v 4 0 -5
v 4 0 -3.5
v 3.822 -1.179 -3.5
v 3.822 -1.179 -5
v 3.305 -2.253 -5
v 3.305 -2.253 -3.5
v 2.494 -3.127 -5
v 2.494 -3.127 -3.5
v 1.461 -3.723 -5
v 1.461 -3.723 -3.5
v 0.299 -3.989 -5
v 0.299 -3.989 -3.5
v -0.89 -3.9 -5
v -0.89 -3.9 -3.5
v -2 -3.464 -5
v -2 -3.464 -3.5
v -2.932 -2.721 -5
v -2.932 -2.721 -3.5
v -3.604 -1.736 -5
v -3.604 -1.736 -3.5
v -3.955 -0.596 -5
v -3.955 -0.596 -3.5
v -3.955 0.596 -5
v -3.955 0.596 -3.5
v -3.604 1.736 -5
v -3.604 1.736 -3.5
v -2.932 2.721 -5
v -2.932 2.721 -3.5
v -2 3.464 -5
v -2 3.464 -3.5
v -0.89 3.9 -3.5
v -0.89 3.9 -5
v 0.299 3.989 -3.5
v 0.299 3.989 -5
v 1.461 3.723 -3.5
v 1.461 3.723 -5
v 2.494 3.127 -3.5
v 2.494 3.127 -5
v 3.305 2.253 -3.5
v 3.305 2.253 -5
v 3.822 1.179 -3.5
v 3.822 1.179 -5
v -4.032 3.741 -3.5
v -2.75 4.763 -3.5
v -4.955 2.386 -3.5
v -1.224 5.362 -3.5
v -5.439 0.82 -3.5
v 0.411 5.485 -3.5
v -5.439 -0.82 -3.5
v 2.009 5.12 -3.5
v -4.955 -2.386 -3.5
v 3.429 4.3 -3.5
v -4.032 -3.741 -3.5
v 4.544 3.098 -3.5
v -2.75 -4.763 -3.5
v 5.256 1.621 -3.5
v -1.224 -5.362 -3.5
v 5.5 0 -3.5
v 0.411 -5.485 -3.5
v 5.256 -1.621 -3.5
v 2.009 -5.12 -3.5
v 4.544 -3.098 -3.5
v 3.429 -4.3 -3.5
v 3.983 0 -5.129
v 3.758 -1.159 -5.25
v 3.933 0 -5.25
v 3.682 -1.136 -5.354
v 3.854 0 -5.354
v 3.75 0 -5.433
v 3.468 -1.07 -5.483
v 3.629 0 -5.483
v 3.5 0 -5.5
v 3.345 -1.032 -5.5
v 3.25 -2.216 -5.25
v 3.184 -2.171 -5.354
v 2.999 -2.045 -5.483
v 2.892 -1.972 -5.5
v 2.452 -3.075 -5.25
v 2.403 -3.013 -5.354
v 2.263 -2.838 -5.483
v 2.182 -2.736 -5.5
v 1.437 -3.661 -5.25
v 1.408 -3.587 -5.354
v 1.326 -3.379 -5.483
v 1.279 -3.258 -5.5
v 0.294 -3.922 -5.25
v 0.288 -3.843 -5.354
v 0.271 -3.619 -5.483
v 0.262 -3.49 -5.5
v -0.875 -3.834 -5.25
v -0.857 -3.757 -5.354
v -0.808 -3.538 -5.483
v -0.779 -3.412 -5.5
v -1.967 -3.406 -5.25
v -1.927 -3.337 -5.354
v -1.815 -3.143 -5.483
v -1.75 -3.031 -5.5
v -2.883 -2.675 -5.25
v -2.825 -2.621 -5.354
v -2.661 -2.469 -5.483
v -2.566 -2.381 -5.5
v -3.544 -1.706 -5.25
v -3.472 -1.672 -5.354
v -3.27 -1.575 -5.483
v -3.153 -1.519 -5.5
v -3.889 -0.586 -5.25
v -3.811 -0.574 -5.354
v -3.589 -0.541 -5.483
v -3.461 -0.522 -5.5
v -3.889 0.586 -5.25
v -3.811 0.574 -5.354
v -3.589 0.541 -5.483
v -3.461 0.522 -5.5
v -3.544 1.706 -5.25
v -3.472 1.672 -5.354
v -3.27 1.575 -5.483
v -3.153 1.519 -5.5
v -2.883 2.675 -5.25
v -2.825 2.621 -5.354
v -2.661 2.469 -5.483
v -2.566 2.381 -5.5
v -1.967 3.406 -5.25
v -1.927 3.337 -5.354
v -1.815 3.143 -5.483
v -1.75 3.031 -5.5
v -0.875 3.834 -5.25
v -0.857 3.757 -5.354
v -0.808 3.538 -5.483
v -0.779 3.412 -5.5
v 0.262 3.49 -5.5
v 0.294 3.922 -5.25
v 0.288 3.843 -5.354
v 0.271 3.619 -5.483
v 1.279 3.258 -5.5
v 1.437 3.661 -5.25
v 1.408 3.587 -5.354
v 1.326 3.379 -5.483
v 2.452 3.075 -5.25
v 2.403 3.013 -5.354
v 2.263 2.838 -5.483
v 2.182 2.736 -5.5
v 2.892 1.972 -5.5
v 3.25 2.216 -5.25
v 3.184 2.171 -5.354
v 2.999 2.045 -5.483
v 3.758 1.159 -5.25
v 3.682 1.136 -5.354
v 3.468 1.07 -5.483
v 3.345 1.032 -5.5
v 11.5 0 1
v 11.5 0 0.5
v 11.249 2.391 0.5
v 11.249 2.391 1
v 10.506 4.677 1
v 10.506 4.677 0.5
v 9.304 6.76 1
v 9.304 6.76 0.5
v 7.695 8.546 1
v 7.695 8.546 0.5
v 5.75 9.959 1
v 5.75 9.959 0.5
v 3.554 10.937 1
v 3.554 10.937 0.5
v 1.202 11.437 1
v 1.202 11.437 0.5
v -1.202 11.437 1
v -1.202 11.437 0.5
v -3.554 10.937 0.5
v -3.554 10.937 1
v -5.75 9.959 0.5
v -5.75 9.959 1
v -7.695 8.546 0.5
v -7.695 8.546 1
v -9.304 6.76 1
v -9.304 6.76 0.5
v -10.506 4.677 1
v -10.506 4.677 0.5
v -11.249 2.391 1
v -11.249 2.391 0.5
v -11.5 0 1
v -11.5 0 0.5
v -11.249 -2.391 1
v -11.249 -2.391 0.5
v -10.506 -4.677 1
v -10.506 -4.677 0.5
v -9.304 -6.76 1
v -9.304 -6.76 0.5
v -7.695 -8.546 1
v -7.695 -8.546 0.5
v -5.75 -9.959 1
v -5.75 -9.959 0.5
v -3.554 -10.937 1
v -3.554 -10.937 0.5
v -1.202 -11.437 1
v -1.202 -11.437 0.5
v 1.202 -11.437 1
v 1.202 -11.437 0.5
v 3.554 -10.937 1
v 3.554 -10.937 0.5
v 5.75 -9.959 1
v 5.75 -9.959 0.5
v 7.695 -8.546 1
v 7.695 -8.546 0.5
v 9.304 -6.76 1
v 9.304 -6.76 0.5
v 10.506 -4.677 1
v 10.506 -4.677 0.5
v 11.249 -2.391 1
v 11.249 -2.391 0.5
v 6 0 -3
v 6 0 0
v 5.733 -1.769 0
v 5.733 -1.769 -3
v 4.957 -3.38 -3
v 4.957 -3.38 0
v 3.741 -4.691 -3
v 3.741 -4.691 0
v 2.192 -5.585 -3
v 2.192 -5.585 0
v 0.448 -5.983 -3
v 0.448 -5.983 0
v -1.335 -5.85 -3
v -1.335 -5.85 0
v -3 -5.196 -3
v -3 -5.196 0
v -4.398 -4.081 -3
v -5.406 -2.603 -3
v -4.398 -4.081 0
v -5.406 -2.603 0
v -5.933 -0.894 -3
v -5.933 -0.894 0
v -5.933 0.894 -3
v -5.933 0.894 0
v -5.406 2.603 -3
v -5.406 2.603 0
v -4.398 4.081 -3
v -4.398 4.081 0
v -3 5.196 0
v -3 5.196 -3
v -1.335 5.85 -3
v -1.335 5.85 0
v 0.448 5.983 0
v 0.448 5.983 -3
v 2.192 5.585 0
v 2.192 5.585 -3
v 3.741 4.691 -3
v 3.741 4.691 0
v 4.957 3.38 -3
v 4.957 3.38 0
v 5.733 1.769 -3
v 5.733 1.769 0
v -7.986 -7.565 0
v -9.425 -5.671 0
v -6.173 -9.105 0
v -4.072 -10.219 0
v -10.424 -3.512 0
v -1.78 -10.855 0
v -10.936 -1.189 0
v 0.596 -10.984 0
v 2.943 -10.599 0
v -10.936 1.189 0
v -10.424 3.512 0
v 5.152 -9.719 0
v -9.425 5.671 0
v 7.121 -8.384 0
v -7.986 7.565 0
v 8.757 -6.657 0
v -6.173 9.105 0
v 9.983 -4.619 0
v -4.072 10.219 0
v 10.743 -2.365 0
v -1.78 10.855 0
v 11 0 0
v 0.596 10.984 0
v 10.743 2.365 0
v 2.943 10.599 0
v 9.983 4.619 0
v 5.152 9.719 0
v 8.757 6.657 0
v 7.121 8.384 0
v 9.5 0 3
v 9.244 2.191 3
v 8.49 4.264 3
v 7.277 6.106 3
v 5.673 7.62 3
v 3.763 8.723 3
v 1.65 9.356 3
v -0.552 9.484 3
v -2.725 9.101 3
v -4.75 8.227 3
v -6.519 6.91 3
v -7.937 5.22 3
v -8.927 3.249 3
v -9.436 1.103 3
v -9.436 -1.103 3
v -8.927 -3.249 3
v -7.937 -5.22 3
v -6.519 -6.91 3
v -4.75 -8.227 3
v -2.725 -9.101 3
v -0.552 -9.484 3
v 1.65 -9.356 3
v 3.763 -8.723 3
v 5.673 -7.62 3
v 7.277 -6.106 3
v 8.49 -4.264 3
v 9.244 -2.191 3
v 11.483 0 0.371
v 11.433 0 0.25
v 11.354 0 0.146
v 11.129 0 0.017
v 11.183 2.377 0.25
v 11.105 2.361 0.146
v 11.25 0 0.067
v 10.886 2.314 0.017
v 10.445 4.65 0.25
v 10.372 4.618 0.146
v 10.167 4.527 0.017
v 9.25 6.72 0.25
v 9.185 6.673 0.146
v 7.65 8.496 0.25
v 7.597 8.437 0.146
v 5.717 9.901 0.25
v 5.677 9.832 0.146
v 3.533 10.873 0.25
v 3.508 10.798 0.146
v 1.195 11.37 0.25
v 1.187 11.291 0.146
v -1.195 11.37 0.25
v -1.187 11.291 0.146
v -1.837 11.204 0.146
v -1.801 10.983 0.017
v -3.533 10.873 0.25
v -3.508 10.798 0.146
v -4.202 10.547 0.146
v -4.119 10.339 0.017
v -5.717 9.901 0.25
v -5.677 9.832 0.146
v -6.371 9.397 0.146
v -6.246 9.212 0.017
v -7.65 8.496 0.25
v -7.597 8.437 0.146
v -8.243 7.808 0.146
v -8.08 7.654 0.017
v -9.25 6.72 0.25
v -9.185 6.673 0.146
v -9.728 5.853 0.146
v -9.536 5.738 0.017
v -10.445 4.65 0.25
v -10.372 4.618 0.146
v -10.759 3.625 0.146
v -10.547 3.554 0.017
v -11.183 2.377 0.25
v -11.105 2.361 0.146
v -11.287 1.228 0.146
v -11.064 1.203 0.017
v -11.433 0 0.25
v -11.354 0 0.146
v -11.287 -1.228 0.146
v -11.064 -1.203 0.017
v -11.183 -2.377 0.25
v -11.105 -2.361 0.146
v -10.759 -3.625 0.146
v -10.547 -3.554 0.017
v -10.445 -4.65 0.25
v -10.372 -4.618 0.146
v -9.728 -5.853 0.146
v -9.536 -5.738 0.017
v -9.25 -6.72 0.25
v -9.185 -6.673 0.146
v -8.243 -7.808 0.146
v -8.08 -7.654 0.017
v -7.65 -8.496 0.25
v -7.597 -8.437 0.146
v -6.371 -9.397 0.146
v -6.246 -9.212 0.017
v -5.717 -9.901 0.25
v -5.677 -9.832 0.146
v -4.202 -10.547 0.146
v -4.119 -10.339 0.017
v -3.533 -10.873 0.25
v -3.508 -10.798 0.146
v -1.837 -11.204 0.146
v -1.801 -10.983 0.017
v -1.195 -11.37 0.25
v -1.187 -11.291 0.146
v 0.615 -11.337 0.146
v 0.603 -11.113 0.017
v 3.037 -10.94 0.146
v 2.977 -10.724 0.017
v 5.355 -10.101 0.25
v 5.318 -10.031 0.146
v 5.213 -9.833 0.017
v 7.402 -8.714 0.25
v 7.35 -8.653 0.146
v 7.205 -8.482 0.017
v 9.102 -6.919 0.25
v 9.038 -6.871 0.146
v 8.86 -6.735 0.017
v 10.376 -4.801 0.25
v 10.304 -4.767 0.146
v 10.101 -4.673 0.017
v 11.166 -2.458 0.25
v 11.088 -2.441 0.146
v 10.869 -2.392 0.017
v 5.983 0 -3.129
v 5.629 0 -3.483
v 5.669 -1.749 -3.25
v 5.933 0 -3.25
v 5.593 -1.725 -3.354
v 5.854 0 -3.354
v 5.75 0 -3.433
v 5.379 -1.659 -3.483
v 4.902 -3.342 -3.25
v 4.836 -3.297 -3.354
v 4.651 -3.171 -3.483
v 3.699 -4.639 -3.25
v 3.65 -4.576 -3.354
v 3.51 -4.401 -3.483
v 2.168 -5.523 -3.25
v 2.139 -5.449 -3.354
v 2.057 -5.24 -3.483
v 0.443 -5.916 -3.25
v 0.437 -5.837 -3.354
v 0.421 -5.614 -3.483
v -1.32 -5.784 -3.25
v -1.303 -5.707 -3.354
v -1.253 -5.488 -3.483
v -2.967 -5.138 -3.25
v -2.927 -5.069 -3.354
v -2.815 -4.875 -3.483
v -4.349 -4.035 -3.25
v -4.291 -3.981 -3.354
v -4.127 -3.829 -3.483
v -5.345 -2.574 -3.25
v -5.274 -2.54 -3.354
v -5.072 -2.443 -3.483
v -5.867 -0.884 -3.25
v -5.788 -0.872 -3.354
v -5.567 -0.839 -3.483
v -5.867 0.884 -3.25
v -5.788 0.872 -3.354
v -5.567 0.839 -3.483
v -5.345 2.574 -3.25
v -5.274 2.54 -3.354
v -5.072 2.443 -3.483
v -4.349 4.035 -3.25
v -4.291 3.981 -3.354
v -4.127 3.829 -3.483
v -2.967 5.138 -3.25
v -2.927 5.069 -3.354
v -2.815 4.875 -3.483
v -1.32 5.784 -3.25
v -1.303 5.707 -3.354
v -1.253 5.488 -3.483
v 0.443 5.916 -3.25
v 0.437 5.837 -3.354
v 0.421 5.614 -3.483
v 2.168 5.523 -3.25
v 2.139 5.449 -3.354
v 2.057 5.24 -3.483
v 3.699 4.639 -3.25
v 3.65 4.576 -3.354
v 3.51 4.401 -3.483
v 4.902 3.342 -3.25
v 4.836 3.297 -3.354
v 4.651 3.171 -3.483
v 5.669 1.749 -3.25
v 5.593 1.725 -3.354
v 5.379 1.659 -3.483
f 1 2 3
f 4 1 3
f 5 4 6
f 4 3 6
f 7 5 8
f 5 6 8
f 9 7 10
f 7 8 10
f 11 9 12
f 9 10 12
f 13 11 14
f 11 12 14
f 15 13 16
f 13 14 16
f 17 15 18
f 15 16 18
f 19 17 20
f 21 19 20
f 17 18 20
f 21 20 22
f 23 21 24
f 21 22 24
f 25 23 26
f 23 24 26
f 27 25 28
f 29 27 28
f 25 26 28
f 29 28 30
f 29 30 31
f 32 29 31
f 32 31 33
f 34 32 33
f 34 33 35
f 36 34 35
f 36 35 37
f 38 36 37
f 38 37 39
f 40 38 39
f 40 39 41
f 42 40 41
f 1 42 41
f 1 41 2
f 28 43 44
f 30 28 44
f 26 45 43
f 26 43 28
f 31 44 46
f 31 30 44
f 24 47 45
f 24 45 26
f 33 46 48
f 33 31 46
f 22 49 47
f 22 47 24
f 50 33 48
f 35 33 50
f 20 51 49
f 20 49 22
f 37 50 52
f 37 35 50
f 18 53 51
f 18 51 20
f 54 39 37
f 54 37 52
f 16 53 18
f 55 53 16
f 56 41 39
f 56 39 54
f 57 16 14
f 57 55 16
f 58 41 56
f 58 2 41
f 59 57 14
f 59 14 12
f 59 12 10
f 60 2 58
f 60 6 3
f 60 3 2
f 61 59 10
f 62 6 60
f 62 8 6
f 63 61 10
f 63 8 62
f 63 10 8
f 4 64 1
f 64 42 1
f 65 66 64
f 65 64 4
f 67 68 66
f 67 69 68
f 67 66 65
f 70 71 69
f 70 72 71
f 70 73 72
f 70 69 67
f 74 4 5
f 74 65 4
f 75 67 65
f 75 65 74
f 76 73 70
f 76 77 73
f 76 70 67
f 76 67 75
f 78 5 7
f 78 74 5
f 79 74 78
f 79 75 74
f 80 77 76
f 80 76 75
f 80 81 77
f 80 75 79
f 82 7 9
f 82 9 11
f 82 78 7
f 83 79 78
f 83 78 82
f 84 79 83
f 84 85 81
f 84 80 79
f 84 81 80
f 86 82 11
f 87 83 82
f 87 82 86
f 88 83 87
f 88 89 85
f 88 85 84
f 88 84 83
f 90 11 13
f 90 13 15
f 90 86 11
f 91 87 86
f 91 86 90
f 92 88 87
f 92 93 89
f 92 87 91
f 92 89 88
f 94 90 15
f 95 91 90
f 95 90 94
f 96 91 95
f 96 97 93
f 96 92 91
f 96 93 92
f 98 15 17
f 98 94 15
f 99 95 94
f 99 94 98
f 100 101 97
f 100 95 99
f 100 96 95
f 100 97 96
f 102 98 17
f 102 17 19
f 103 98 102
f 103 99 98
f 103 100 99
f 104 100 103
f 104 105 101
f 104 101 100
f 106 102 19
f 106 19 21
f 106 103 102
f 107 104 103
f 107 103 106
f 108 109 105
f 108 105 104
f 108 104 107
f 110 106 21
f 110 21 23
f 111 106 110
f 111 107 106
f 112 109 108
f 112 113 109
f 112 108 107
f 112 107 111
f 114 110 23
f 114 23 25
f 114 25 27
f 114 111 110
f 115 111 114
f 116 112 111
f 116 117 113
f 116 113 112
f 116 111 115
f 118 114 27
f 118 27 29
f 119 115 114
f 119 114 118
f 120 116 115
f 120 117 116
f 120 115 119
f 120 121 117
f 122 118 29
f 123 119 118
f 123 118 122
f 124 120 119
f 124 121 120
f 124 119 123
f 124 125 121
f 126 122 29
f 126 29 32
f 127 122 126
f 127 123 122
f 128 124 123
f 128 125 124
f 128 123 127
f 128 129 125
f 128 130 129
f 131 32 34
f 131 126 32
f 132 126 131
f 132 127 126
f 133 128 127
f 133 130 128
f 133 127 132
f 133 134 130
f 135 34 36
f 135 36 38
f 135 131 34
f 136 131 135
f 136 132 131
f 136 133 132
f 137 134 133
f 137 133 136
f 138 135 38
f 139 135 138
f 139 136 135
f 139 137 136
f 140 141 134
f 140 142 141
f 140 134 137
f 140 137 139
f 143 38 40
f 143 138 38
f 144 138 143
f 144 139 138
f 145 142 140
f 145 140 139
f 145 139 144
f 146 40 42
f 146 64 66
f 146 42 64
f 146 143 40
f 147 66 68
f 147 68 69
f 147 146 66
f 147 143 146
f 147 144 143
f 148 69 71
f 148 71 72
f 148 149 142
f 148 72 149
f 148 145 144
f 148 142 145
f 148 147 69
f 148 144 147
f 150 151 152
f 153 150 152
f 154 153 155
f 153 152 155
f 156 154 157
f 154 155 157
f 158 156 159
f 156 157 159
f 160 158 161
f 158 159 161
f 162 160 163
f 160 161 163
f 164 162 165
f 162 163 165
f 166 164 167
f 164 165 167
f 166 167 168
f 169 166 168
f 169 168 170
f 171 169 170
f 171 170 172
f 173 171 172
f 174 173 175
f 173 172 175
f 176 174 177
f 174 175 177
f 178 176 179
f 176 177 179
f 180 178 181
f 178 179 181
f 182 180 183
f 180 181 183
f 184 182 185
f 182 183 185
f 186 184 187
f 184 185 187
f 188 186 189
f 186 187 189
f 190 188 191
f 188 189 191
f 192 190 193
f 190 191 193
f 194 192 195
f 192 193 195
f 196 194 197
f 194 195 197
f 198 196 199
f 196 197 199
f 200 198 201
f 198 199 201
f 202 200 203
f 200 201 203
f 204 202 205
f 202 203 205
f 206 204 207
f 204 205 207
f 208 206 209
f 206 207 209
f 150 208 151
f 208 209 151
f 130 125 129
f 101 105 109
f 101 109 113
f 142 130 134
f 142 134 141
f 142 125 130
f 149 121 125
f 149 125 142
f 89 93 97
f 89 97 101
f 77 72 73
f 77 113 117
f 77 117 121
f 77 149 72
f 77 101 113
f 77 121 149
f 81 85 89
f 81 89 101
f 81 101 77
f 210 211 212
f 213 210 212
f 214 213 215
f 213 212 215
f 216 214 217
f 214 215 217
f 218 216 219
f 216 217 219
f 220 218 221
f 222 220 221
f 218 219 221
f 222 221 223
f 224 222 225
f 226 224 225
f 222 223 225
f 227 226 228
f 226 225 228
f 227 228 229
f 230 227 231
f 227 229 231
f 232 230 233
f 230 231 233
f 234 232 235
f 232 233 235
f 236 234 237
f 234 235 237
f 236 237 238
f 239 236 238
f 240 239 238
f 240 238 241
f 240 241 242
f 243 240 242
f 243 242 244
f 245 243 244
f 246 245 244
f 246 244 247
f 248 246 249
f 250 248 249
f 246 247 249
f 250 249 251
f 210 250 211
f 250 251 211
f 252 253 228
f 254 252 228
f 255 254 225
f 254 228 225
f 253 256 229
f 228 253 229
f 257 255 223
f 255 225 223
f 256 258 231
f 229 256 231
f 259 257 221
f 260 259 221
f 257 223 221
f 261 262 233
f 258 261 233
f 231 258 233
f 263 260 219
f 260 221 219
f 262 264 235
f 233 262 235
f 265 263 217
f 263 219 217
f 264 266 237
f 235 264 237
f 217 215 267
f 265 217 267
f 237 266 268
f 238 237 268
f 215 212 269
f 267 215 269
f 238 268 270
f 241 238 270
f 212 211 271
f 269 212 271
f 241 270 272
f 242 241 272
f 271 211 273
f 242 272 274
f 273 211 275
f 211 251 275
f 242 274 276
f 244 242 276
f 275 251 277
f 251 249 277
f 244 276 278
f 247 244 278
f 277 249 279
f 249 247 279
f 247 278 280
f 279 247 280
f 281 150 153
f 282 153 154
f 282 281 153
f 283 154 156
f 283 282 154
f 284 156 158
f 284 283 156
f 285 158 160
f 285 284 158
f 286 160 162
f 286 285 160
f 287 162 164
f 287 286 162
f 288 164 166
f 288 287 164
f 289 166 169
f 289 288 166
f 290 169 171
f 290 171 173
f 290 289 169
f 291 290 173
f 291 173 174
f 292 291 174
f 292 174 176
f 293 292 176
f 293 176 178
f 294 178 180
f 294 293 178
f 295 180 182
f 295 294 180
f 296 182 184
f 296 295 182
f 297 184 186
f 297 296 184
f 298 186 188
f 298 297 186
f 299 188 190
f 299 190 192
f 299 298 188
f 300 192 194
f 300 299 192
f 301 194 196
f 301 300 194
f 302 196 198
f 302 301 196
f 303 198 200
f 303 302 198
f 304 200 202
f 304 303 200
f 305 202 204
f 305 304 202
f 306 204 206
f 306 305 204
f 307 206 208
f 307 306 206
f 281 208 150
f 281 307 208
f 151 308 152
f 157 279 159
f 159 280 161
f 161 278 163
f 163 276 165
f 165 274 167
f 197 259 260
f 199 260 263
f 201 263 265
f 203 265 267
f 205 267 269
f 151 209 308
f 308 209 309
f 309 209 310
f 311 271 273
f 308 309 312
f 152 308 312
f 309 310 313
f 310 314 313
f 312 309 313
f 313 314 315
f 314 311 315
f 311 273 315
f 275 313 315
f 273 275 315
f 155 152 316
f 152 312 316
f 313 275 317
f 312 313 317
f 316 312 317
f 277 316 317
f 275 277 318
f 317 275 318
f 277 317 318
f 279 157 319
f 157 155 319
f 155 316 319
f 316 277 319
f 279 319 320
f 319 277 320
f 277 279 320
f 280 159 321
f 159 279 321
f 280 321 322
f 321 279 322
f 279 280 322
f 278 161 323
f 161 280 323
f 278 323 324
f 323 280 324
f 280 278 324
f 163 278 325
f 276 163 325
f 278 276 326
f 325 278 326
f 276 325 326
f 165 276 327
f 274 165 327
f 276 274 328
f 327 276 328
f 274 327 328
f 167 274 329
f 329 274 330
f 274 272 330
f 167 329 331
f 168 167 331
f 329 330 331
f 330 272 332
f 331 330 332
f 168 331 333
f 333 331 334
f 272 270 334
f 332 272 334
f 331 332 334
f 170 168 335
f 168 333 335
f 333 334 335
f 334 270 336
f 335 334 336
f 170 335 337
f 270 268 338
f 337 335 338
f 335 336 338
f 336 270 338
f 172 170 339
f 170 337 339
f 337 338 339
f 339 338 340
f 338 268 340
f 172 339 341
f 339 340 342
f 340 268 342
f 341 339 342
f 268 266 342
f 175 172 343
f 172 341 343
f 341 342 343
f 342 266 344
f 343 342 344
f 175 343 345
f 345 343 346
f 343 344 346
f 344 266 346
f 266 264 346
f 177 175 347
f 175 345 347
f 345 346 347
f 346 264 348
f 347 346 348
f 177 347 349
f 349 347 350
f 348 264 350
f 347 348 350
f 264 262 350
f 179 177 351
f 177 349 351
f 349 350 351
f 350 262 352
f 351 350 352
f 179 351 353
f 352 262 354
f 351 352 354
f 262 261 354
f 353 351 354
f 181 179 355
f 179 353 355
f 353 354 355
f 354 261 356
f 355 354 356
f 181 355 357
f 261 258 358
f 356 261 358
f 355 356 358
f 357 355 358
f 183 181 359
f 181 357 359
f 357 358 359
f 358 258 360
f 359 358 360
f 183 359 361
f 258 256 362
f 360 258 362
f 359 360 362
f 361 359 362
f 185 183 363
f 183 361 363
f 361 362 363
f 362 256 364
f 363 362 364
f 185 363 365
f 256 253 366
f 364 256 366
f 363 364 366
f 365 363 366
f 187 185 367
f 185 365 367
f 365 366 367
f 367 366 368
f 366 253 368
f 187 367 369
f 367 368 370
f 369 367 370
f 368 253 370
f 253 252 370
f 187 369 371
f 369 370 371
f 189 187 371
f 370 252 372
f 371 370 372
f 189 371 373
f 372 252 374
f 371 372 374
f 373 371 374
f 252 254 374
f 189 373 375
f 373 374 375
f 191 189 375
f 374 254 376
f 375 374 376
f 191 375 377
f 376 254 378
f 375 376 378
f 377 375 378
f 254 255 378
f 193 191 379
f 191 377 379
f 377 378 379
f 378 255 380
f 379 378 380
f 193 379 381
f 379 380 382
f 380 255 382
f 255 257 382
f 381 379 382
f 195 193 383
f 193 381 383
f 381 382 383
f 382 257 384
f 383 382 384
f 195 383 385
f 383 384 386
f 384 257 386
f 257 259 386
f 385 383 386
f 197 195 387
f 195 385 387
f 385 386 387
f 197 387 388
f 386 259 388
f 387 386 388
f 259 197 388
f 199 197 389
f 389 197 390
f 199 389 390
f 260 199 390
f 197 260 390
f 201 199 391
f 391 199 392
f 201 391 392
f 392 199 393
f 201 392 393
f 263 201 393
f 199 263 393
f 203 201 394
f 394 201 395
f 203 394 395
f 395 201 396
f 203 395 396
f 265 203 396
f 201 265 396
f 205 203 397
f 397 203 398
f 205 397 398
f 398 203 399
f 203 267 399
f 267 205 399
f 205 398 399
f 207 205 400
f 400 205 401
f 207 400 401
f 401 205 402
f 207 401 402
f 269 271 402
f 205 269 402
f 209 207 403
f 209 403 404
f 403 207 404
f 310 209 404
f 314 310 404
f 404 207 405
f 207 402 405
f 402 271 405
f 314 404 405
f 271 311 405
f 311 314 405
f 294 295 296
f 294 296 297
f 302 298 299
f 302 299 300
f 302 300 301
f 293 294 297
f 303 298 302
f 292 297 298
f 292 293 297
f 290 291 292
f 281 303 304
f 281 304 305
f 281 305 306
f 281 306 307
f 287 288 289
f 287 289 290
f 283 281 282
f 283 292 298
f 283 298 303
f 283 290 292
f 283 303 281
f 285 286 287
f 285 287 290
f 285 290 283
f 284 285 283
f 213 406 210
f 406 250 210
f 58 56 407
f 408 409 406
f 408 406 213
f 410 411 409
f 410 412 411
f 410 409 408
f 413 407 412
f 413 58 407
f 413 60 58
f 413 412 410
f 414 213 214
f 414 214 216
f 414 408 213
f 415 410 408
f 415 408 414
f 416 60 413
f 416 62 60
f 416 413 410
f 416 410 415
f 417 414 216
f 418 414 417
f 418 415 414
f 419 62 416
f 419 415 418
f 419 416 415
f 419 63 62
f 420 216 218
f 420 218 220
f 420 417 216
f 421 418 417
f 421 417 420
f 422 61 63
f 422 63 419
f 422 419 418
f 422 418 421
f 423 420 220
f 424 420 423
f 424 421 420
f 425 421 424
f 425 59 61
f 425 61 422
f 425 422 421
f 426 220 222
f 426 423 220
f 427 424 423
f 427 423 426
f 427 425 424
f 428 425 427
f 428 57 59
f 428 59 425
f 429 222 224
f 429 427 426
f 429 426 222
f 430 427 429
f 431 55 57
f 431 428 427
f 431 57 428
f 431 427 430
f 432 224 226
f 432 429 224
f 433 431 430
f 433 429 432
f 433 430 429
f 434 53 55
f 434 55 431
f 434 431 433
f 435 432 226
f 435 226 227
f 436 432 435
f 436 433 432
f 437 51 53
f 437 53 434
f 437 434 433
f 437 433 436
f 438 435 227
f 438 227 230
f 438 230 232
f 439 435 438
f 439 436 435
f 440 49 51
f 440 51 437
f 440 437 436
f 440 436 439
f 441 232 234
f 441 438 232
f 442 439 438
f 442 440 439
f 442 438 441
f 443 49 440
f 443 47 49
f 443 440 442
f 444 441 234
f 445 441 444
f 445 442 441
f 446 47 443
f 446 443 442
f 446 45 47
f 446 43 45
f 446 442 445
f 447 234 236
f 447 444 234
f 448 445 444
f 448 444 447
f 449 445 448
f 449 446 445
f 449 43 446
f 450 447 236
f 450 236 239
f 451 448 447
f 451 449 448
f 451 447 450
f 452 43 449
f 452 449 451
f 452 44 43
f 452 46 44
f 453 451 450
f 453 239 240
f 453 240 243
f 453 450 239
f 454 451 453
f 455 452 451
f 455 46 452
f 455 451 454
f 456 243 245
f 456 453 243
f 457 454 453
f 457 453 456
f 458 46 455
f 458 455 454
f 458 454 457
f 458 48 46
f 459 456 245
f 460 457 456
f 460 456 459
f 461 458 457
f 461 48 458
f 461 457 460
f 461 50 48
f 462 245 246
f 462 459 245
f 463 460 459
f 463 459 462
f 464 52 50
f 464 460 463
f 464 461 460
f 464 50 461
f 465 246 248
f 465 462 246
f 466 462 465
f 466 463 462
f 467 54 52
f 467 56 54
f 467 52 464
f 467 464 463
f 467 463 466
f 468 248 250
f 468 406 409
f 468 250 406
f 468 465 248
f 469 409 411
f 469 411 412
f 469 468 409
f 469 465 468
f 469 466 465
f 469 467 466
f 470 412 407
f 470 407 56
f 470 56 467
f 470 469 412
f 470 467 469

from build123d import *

# Parameters (mm, degrees)
F0_R     = 11.5
F1_DEPTH = 3
F2_R     = 4
F3_DEPTH = 5.5
F4_R     = 6
F5_DEPTH = 3.5
F6_SIZE  = 2
F7_R     = 0.5


with BuildPart() as f1:
    # F0 (on Top) → F1 (new body)
    with BuildSketch(Plane.XY):
        Circle(F0_R)
    extrude(amount=F1_DEPTH)

    # F2 (on face) → F3 (join)
    with BuildSketch(Plane(origin=(0, 0, 0), x_dir=(1, 0, 0), z_dir=(0, 0, -1))):
        Circle(F2_R)
    extrude(amount=F3_DEPTH)

    # F4 (on face) → F5 (join)
    with BuildSketch(Plane(origin=(0, 0, 0), x_dir=(1, 0, 0), z_dir=(0, 0, -1))):
        Circle(F4_R)
    extrude(amount=F5_DEPTH)

    # F6
    f6_edges = [f1.edges().sort_by_distance(p)[0] for p in [
        (-11.5, 0, 3),
    ]]
    chamfer(f6_edges, length=F6_SIZE)

    # F7
    f7_edges = [f1.edges().sort_by_distance(p)[0] for p in [
        (-6, 0, -3.5),
        (-4, 0, -5.5),
        (-11.5, 0, 0),
    ]]
    fillet(f7_edges, radius=F7_R)


solid = f1.part
